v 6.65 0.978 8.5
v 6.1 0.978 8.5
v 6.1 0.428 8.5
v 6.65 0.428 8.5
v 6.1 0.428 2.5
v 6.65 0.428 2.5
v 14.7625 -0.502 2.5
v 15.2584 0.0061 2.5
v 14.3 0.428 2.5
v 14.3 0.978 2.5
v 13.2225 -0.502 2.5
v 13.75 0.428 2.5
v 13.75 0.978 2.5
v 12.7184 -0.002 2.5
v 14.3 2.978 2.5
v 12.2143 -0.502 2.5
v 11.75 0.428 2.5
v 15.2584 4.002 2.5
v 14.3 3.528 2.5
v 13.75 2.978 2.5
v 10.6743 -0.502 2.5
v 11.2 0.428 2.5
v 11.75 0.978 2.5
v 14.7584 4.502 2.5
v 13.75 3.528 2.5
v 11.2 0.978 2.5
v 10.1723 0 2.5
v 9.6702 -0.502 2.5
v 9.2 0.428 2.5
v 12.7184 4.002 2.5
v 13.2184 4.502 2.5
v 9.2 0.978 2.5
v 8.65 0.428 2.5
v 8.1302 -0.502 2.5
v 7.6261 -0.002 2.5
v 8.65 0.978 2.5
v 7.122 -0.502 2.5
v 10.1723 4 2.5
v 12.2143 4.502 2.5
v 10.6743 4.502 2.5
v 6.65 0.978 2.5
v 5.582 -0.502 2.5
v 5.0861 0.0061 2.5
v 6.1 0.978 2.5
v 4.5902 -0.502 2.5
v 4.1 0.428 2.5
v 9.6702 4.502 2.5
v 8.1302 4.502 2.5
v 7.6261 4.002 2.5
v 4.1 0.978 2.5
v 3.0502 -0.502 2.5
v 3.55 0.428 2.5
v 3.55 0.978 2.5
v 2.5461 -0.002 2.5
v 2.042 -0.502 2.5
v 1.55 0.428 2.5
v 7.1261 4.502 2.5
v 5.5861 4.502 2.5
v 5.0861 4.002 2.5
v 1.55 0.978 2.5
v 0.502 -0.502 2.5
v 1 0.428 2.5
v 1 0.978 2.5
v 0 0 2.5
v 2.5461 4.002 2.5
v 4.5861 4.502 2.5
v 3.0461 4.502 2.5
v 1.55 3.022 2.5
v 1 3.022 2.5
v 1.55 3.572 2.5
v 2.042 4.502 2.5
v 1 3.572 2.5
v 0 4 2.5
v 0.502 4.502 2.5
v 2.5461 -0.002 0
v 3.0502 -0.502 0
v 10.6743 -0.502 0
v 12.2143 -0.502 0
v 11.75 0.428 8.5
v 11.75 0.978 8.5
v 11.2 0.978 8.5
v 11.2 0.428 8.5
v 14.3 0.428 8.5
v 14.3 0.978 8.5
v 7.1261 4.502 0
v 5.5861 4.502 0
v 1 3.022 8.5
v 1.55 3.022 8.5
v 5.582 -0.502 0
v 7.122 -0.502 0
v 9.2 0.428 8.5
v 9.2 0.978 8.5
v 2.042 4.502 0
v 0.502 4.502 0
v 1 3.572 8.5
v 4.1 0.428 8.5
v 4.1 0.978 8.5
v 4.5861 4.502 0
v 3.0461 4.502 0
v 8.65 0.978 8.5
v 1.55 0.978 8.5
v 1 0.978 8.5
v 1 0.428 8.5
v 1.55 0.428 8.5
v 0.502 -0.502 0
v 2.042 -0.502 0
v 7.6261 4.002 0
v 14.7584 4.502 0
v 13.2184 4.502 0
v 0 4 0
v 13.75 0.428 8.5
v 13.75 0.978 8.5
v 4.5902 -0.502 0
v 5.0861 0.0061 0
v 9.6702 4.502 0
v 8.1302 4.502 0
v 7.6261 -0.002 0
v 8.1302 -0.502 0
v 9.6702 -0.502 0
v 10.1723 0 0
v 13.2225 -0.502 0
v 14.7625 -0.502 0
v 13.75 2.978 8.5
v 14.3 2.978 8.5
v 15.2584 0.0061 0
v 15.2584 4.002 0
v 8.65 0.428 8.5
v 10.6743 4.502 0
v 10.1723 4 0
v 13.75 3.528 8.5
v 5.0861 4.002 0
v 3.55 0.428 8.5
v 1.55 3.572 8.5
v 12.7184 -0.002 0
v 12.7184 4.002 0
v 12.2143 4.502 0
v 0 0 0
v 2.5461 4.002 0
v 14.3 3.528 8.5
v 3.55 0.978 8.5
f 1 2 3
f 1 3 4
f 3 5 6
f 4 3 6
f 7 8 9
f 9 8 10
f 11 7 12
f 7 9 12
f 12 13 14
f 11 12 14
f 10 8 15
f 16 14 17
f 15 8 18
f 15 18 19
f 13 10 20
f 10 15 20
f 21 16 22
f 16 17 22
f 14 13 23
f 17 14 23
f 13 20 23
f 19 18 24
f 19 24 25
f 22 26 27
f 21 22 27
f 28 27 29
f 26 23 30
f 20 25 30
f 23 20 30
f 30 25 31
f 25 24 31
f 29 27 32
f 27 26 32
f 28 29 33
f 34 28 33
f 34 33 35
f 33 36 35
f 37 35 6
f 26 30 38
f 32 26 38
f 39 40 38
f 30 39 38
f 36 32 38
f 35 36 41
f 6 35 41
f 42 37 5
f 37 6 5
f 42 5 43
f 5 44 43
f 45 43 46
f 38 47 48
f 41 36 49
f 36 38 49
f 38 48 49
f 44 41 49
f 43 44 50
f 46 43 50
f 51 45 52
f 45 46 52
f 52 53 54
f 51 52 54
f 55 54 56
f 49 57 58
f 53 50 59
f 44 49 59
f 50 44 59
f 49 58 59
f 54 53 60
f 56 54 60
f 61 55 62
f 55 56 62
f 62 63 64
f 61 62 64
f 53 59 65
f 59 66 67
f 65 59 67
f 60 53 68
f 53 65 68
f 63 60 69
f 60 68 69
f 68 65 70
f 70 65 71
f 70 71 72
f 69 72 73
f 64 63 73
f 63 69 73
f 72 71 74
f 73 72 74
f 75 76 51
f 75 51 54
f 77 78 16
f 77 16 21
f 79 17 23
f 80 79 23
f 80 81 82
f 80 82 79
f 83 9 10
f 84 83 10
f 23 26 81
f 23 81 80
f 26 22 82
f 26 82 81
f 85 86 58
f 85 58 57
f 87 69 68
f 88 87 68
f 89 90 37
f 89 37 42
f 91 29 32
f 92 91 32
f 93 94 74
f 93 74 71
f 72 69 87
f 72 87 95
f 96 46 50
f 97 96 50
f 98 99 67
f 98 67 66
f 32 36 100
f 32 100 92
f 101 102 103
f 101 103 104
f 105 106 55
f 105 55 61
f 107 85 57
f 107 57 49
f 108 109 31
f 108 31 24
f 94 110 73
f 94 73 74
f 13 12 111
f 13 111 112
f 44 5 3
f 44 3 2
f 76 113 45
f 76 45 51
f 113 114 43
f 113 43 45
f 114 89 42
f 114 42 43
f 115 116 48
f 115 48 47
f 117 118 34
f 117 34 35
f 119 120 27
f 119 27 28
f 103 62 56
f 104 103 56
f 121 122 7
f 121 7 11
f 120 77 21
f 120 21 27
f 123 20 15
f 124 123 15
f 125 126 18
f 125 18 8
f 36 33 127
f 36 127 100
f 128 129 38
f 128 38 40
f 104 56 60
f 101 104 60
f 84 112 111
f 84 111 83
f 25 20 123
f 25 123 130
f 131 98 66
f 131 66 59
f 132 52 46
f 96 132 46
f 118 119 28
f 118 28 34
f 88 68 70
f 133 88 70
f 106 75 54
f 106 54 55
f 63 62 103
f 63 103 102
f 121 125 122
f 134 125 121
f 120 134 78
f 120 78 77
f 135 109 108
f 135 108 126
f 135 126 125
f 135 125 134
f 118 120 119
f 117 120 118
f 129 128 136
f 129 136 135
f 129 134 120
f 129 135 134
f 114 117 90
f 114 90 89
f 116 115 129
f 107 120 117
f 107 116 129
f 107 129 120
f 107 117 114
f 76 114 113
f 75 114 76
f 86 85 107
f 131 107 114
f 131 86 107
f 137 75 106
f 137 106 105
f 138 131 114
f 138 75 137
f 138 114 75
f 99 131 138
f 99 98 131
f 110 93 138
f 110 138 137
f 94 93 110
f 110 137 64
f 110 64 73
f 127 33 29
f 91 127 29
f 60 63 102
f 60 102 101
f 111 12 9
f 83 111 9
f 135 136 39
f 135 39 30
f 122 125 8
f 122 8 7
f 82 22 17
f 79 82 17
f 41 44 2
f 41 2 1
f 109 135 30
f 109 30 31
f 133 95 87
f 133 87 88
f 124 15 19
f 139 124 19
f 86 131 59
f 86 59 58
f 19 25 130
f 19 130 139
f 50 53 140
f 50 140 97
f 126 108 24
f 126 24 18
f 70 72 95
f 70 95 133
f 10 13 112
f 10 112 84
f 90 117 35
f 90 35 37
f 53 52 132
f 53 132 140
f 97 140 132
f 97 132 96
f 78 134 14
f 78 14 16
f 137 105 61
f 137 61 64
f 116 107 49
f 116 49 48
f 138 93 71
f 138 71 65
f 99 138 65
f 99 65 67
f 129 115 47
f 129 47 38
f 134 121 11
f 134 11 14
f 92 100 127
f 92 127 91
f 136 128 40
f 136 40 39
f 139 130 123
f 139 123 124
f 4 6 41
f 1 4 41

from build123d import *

# Parameters (mm, degrees)
BOSS_EXTRUDE1_DEPTH = 2.5
SKETCH2_W           = 0.55
SKETCH2_H           = 0.55
BOSS_EXTRUDE2_DEPTH = 6


with BuildPart() as part:
    # Sketch1 → Boss-Extrude1 (new body)
    with BuildSketch(Plane.XY):
        Polygon((0, 0), (0, 4), (0.502045815, 4.502045815), (2.042045815, 4.502045815), (2.546129141, 4.002045815), (3.046129141, 4.502045815), (4.586129141, 4.502045815), (5.086129141, 4.002045815), (5.586129141, 4.502045815), (7.126129141, 4.502045815), (7.626129141, 4.002045815), (8.130212468, 4.502045815), (9.670212468, 4.502045815), (10.172258282, 4), (10.674304097, 4.502045815), (12.214304097, 4.502045815), (12.718387423, 4.002045815), (13.218387423, 4.502045815), (14.758387423, 4.502045815), (15.258387423, 4.002045815), (15.258387423, 0.006055212), (14.76247075, -0.502045815), (13.22247075, -0.502045815), (12.718387423, -0.002045815), (12.214304097, -0.502045815), (10.674304097, -0.502045815), (10.172258282, 0), (9.670212468, -0.502045815), (8.130212468, -0.502045815), (7.626129141, -0.002045815), (7.122045815, -0.502045815), (5.582045815, -0.502045815), (5.086129141, 0.006055212), (4.590212468, -0.502045815), (3.050212468, -0.502045815), (2.546129141, -0.002045815), (2.042045815, -0.502045815), (0.502045815, -0.502045815), align=None)
    extrude(amount=BOSS_EXTRUDE1_DEPTH)

    # Sketch2 → Boss-Extrude2 (add)
    with BuildSketch(Plane.XY.offset(2.5)):
        with Locations((1.275, 0.702954185)):
            Rectangle(SKETCH2_W, SKETCH2_H)
        with Locations((1.275, 3.297045815)):
            Rectangle(SKETCH2_W, SKETCH2_H)
        with Locations((3.825, 0.702954185)):
            Rectangle(SKETCH2_W, SKETCH2_H)
        with Locations((6.375, 0.702954185)):
            Rectangle(SKETCH2_W, SKETCH2_H)
        with Locations((8.925, 0.702954185)):
            Rectangle(SKETCH2_W, SKETCH2_H)
        with Locations((11.475, 0.702954185)):
            Rectangle(SKETCH2_W, SKETCH2_H)
        with Locations((14.025, 0.702954185)):
            Rectangle(SKETCH2_W, SKETCH2_H)
        with Locations((14.025, 3.252954185)):
            Rectangle(SKETCH2_W, SKETCH2_H)
    extrude(amount=BOSS_EXTRUDE2_DEPTH)


solid = part.part
